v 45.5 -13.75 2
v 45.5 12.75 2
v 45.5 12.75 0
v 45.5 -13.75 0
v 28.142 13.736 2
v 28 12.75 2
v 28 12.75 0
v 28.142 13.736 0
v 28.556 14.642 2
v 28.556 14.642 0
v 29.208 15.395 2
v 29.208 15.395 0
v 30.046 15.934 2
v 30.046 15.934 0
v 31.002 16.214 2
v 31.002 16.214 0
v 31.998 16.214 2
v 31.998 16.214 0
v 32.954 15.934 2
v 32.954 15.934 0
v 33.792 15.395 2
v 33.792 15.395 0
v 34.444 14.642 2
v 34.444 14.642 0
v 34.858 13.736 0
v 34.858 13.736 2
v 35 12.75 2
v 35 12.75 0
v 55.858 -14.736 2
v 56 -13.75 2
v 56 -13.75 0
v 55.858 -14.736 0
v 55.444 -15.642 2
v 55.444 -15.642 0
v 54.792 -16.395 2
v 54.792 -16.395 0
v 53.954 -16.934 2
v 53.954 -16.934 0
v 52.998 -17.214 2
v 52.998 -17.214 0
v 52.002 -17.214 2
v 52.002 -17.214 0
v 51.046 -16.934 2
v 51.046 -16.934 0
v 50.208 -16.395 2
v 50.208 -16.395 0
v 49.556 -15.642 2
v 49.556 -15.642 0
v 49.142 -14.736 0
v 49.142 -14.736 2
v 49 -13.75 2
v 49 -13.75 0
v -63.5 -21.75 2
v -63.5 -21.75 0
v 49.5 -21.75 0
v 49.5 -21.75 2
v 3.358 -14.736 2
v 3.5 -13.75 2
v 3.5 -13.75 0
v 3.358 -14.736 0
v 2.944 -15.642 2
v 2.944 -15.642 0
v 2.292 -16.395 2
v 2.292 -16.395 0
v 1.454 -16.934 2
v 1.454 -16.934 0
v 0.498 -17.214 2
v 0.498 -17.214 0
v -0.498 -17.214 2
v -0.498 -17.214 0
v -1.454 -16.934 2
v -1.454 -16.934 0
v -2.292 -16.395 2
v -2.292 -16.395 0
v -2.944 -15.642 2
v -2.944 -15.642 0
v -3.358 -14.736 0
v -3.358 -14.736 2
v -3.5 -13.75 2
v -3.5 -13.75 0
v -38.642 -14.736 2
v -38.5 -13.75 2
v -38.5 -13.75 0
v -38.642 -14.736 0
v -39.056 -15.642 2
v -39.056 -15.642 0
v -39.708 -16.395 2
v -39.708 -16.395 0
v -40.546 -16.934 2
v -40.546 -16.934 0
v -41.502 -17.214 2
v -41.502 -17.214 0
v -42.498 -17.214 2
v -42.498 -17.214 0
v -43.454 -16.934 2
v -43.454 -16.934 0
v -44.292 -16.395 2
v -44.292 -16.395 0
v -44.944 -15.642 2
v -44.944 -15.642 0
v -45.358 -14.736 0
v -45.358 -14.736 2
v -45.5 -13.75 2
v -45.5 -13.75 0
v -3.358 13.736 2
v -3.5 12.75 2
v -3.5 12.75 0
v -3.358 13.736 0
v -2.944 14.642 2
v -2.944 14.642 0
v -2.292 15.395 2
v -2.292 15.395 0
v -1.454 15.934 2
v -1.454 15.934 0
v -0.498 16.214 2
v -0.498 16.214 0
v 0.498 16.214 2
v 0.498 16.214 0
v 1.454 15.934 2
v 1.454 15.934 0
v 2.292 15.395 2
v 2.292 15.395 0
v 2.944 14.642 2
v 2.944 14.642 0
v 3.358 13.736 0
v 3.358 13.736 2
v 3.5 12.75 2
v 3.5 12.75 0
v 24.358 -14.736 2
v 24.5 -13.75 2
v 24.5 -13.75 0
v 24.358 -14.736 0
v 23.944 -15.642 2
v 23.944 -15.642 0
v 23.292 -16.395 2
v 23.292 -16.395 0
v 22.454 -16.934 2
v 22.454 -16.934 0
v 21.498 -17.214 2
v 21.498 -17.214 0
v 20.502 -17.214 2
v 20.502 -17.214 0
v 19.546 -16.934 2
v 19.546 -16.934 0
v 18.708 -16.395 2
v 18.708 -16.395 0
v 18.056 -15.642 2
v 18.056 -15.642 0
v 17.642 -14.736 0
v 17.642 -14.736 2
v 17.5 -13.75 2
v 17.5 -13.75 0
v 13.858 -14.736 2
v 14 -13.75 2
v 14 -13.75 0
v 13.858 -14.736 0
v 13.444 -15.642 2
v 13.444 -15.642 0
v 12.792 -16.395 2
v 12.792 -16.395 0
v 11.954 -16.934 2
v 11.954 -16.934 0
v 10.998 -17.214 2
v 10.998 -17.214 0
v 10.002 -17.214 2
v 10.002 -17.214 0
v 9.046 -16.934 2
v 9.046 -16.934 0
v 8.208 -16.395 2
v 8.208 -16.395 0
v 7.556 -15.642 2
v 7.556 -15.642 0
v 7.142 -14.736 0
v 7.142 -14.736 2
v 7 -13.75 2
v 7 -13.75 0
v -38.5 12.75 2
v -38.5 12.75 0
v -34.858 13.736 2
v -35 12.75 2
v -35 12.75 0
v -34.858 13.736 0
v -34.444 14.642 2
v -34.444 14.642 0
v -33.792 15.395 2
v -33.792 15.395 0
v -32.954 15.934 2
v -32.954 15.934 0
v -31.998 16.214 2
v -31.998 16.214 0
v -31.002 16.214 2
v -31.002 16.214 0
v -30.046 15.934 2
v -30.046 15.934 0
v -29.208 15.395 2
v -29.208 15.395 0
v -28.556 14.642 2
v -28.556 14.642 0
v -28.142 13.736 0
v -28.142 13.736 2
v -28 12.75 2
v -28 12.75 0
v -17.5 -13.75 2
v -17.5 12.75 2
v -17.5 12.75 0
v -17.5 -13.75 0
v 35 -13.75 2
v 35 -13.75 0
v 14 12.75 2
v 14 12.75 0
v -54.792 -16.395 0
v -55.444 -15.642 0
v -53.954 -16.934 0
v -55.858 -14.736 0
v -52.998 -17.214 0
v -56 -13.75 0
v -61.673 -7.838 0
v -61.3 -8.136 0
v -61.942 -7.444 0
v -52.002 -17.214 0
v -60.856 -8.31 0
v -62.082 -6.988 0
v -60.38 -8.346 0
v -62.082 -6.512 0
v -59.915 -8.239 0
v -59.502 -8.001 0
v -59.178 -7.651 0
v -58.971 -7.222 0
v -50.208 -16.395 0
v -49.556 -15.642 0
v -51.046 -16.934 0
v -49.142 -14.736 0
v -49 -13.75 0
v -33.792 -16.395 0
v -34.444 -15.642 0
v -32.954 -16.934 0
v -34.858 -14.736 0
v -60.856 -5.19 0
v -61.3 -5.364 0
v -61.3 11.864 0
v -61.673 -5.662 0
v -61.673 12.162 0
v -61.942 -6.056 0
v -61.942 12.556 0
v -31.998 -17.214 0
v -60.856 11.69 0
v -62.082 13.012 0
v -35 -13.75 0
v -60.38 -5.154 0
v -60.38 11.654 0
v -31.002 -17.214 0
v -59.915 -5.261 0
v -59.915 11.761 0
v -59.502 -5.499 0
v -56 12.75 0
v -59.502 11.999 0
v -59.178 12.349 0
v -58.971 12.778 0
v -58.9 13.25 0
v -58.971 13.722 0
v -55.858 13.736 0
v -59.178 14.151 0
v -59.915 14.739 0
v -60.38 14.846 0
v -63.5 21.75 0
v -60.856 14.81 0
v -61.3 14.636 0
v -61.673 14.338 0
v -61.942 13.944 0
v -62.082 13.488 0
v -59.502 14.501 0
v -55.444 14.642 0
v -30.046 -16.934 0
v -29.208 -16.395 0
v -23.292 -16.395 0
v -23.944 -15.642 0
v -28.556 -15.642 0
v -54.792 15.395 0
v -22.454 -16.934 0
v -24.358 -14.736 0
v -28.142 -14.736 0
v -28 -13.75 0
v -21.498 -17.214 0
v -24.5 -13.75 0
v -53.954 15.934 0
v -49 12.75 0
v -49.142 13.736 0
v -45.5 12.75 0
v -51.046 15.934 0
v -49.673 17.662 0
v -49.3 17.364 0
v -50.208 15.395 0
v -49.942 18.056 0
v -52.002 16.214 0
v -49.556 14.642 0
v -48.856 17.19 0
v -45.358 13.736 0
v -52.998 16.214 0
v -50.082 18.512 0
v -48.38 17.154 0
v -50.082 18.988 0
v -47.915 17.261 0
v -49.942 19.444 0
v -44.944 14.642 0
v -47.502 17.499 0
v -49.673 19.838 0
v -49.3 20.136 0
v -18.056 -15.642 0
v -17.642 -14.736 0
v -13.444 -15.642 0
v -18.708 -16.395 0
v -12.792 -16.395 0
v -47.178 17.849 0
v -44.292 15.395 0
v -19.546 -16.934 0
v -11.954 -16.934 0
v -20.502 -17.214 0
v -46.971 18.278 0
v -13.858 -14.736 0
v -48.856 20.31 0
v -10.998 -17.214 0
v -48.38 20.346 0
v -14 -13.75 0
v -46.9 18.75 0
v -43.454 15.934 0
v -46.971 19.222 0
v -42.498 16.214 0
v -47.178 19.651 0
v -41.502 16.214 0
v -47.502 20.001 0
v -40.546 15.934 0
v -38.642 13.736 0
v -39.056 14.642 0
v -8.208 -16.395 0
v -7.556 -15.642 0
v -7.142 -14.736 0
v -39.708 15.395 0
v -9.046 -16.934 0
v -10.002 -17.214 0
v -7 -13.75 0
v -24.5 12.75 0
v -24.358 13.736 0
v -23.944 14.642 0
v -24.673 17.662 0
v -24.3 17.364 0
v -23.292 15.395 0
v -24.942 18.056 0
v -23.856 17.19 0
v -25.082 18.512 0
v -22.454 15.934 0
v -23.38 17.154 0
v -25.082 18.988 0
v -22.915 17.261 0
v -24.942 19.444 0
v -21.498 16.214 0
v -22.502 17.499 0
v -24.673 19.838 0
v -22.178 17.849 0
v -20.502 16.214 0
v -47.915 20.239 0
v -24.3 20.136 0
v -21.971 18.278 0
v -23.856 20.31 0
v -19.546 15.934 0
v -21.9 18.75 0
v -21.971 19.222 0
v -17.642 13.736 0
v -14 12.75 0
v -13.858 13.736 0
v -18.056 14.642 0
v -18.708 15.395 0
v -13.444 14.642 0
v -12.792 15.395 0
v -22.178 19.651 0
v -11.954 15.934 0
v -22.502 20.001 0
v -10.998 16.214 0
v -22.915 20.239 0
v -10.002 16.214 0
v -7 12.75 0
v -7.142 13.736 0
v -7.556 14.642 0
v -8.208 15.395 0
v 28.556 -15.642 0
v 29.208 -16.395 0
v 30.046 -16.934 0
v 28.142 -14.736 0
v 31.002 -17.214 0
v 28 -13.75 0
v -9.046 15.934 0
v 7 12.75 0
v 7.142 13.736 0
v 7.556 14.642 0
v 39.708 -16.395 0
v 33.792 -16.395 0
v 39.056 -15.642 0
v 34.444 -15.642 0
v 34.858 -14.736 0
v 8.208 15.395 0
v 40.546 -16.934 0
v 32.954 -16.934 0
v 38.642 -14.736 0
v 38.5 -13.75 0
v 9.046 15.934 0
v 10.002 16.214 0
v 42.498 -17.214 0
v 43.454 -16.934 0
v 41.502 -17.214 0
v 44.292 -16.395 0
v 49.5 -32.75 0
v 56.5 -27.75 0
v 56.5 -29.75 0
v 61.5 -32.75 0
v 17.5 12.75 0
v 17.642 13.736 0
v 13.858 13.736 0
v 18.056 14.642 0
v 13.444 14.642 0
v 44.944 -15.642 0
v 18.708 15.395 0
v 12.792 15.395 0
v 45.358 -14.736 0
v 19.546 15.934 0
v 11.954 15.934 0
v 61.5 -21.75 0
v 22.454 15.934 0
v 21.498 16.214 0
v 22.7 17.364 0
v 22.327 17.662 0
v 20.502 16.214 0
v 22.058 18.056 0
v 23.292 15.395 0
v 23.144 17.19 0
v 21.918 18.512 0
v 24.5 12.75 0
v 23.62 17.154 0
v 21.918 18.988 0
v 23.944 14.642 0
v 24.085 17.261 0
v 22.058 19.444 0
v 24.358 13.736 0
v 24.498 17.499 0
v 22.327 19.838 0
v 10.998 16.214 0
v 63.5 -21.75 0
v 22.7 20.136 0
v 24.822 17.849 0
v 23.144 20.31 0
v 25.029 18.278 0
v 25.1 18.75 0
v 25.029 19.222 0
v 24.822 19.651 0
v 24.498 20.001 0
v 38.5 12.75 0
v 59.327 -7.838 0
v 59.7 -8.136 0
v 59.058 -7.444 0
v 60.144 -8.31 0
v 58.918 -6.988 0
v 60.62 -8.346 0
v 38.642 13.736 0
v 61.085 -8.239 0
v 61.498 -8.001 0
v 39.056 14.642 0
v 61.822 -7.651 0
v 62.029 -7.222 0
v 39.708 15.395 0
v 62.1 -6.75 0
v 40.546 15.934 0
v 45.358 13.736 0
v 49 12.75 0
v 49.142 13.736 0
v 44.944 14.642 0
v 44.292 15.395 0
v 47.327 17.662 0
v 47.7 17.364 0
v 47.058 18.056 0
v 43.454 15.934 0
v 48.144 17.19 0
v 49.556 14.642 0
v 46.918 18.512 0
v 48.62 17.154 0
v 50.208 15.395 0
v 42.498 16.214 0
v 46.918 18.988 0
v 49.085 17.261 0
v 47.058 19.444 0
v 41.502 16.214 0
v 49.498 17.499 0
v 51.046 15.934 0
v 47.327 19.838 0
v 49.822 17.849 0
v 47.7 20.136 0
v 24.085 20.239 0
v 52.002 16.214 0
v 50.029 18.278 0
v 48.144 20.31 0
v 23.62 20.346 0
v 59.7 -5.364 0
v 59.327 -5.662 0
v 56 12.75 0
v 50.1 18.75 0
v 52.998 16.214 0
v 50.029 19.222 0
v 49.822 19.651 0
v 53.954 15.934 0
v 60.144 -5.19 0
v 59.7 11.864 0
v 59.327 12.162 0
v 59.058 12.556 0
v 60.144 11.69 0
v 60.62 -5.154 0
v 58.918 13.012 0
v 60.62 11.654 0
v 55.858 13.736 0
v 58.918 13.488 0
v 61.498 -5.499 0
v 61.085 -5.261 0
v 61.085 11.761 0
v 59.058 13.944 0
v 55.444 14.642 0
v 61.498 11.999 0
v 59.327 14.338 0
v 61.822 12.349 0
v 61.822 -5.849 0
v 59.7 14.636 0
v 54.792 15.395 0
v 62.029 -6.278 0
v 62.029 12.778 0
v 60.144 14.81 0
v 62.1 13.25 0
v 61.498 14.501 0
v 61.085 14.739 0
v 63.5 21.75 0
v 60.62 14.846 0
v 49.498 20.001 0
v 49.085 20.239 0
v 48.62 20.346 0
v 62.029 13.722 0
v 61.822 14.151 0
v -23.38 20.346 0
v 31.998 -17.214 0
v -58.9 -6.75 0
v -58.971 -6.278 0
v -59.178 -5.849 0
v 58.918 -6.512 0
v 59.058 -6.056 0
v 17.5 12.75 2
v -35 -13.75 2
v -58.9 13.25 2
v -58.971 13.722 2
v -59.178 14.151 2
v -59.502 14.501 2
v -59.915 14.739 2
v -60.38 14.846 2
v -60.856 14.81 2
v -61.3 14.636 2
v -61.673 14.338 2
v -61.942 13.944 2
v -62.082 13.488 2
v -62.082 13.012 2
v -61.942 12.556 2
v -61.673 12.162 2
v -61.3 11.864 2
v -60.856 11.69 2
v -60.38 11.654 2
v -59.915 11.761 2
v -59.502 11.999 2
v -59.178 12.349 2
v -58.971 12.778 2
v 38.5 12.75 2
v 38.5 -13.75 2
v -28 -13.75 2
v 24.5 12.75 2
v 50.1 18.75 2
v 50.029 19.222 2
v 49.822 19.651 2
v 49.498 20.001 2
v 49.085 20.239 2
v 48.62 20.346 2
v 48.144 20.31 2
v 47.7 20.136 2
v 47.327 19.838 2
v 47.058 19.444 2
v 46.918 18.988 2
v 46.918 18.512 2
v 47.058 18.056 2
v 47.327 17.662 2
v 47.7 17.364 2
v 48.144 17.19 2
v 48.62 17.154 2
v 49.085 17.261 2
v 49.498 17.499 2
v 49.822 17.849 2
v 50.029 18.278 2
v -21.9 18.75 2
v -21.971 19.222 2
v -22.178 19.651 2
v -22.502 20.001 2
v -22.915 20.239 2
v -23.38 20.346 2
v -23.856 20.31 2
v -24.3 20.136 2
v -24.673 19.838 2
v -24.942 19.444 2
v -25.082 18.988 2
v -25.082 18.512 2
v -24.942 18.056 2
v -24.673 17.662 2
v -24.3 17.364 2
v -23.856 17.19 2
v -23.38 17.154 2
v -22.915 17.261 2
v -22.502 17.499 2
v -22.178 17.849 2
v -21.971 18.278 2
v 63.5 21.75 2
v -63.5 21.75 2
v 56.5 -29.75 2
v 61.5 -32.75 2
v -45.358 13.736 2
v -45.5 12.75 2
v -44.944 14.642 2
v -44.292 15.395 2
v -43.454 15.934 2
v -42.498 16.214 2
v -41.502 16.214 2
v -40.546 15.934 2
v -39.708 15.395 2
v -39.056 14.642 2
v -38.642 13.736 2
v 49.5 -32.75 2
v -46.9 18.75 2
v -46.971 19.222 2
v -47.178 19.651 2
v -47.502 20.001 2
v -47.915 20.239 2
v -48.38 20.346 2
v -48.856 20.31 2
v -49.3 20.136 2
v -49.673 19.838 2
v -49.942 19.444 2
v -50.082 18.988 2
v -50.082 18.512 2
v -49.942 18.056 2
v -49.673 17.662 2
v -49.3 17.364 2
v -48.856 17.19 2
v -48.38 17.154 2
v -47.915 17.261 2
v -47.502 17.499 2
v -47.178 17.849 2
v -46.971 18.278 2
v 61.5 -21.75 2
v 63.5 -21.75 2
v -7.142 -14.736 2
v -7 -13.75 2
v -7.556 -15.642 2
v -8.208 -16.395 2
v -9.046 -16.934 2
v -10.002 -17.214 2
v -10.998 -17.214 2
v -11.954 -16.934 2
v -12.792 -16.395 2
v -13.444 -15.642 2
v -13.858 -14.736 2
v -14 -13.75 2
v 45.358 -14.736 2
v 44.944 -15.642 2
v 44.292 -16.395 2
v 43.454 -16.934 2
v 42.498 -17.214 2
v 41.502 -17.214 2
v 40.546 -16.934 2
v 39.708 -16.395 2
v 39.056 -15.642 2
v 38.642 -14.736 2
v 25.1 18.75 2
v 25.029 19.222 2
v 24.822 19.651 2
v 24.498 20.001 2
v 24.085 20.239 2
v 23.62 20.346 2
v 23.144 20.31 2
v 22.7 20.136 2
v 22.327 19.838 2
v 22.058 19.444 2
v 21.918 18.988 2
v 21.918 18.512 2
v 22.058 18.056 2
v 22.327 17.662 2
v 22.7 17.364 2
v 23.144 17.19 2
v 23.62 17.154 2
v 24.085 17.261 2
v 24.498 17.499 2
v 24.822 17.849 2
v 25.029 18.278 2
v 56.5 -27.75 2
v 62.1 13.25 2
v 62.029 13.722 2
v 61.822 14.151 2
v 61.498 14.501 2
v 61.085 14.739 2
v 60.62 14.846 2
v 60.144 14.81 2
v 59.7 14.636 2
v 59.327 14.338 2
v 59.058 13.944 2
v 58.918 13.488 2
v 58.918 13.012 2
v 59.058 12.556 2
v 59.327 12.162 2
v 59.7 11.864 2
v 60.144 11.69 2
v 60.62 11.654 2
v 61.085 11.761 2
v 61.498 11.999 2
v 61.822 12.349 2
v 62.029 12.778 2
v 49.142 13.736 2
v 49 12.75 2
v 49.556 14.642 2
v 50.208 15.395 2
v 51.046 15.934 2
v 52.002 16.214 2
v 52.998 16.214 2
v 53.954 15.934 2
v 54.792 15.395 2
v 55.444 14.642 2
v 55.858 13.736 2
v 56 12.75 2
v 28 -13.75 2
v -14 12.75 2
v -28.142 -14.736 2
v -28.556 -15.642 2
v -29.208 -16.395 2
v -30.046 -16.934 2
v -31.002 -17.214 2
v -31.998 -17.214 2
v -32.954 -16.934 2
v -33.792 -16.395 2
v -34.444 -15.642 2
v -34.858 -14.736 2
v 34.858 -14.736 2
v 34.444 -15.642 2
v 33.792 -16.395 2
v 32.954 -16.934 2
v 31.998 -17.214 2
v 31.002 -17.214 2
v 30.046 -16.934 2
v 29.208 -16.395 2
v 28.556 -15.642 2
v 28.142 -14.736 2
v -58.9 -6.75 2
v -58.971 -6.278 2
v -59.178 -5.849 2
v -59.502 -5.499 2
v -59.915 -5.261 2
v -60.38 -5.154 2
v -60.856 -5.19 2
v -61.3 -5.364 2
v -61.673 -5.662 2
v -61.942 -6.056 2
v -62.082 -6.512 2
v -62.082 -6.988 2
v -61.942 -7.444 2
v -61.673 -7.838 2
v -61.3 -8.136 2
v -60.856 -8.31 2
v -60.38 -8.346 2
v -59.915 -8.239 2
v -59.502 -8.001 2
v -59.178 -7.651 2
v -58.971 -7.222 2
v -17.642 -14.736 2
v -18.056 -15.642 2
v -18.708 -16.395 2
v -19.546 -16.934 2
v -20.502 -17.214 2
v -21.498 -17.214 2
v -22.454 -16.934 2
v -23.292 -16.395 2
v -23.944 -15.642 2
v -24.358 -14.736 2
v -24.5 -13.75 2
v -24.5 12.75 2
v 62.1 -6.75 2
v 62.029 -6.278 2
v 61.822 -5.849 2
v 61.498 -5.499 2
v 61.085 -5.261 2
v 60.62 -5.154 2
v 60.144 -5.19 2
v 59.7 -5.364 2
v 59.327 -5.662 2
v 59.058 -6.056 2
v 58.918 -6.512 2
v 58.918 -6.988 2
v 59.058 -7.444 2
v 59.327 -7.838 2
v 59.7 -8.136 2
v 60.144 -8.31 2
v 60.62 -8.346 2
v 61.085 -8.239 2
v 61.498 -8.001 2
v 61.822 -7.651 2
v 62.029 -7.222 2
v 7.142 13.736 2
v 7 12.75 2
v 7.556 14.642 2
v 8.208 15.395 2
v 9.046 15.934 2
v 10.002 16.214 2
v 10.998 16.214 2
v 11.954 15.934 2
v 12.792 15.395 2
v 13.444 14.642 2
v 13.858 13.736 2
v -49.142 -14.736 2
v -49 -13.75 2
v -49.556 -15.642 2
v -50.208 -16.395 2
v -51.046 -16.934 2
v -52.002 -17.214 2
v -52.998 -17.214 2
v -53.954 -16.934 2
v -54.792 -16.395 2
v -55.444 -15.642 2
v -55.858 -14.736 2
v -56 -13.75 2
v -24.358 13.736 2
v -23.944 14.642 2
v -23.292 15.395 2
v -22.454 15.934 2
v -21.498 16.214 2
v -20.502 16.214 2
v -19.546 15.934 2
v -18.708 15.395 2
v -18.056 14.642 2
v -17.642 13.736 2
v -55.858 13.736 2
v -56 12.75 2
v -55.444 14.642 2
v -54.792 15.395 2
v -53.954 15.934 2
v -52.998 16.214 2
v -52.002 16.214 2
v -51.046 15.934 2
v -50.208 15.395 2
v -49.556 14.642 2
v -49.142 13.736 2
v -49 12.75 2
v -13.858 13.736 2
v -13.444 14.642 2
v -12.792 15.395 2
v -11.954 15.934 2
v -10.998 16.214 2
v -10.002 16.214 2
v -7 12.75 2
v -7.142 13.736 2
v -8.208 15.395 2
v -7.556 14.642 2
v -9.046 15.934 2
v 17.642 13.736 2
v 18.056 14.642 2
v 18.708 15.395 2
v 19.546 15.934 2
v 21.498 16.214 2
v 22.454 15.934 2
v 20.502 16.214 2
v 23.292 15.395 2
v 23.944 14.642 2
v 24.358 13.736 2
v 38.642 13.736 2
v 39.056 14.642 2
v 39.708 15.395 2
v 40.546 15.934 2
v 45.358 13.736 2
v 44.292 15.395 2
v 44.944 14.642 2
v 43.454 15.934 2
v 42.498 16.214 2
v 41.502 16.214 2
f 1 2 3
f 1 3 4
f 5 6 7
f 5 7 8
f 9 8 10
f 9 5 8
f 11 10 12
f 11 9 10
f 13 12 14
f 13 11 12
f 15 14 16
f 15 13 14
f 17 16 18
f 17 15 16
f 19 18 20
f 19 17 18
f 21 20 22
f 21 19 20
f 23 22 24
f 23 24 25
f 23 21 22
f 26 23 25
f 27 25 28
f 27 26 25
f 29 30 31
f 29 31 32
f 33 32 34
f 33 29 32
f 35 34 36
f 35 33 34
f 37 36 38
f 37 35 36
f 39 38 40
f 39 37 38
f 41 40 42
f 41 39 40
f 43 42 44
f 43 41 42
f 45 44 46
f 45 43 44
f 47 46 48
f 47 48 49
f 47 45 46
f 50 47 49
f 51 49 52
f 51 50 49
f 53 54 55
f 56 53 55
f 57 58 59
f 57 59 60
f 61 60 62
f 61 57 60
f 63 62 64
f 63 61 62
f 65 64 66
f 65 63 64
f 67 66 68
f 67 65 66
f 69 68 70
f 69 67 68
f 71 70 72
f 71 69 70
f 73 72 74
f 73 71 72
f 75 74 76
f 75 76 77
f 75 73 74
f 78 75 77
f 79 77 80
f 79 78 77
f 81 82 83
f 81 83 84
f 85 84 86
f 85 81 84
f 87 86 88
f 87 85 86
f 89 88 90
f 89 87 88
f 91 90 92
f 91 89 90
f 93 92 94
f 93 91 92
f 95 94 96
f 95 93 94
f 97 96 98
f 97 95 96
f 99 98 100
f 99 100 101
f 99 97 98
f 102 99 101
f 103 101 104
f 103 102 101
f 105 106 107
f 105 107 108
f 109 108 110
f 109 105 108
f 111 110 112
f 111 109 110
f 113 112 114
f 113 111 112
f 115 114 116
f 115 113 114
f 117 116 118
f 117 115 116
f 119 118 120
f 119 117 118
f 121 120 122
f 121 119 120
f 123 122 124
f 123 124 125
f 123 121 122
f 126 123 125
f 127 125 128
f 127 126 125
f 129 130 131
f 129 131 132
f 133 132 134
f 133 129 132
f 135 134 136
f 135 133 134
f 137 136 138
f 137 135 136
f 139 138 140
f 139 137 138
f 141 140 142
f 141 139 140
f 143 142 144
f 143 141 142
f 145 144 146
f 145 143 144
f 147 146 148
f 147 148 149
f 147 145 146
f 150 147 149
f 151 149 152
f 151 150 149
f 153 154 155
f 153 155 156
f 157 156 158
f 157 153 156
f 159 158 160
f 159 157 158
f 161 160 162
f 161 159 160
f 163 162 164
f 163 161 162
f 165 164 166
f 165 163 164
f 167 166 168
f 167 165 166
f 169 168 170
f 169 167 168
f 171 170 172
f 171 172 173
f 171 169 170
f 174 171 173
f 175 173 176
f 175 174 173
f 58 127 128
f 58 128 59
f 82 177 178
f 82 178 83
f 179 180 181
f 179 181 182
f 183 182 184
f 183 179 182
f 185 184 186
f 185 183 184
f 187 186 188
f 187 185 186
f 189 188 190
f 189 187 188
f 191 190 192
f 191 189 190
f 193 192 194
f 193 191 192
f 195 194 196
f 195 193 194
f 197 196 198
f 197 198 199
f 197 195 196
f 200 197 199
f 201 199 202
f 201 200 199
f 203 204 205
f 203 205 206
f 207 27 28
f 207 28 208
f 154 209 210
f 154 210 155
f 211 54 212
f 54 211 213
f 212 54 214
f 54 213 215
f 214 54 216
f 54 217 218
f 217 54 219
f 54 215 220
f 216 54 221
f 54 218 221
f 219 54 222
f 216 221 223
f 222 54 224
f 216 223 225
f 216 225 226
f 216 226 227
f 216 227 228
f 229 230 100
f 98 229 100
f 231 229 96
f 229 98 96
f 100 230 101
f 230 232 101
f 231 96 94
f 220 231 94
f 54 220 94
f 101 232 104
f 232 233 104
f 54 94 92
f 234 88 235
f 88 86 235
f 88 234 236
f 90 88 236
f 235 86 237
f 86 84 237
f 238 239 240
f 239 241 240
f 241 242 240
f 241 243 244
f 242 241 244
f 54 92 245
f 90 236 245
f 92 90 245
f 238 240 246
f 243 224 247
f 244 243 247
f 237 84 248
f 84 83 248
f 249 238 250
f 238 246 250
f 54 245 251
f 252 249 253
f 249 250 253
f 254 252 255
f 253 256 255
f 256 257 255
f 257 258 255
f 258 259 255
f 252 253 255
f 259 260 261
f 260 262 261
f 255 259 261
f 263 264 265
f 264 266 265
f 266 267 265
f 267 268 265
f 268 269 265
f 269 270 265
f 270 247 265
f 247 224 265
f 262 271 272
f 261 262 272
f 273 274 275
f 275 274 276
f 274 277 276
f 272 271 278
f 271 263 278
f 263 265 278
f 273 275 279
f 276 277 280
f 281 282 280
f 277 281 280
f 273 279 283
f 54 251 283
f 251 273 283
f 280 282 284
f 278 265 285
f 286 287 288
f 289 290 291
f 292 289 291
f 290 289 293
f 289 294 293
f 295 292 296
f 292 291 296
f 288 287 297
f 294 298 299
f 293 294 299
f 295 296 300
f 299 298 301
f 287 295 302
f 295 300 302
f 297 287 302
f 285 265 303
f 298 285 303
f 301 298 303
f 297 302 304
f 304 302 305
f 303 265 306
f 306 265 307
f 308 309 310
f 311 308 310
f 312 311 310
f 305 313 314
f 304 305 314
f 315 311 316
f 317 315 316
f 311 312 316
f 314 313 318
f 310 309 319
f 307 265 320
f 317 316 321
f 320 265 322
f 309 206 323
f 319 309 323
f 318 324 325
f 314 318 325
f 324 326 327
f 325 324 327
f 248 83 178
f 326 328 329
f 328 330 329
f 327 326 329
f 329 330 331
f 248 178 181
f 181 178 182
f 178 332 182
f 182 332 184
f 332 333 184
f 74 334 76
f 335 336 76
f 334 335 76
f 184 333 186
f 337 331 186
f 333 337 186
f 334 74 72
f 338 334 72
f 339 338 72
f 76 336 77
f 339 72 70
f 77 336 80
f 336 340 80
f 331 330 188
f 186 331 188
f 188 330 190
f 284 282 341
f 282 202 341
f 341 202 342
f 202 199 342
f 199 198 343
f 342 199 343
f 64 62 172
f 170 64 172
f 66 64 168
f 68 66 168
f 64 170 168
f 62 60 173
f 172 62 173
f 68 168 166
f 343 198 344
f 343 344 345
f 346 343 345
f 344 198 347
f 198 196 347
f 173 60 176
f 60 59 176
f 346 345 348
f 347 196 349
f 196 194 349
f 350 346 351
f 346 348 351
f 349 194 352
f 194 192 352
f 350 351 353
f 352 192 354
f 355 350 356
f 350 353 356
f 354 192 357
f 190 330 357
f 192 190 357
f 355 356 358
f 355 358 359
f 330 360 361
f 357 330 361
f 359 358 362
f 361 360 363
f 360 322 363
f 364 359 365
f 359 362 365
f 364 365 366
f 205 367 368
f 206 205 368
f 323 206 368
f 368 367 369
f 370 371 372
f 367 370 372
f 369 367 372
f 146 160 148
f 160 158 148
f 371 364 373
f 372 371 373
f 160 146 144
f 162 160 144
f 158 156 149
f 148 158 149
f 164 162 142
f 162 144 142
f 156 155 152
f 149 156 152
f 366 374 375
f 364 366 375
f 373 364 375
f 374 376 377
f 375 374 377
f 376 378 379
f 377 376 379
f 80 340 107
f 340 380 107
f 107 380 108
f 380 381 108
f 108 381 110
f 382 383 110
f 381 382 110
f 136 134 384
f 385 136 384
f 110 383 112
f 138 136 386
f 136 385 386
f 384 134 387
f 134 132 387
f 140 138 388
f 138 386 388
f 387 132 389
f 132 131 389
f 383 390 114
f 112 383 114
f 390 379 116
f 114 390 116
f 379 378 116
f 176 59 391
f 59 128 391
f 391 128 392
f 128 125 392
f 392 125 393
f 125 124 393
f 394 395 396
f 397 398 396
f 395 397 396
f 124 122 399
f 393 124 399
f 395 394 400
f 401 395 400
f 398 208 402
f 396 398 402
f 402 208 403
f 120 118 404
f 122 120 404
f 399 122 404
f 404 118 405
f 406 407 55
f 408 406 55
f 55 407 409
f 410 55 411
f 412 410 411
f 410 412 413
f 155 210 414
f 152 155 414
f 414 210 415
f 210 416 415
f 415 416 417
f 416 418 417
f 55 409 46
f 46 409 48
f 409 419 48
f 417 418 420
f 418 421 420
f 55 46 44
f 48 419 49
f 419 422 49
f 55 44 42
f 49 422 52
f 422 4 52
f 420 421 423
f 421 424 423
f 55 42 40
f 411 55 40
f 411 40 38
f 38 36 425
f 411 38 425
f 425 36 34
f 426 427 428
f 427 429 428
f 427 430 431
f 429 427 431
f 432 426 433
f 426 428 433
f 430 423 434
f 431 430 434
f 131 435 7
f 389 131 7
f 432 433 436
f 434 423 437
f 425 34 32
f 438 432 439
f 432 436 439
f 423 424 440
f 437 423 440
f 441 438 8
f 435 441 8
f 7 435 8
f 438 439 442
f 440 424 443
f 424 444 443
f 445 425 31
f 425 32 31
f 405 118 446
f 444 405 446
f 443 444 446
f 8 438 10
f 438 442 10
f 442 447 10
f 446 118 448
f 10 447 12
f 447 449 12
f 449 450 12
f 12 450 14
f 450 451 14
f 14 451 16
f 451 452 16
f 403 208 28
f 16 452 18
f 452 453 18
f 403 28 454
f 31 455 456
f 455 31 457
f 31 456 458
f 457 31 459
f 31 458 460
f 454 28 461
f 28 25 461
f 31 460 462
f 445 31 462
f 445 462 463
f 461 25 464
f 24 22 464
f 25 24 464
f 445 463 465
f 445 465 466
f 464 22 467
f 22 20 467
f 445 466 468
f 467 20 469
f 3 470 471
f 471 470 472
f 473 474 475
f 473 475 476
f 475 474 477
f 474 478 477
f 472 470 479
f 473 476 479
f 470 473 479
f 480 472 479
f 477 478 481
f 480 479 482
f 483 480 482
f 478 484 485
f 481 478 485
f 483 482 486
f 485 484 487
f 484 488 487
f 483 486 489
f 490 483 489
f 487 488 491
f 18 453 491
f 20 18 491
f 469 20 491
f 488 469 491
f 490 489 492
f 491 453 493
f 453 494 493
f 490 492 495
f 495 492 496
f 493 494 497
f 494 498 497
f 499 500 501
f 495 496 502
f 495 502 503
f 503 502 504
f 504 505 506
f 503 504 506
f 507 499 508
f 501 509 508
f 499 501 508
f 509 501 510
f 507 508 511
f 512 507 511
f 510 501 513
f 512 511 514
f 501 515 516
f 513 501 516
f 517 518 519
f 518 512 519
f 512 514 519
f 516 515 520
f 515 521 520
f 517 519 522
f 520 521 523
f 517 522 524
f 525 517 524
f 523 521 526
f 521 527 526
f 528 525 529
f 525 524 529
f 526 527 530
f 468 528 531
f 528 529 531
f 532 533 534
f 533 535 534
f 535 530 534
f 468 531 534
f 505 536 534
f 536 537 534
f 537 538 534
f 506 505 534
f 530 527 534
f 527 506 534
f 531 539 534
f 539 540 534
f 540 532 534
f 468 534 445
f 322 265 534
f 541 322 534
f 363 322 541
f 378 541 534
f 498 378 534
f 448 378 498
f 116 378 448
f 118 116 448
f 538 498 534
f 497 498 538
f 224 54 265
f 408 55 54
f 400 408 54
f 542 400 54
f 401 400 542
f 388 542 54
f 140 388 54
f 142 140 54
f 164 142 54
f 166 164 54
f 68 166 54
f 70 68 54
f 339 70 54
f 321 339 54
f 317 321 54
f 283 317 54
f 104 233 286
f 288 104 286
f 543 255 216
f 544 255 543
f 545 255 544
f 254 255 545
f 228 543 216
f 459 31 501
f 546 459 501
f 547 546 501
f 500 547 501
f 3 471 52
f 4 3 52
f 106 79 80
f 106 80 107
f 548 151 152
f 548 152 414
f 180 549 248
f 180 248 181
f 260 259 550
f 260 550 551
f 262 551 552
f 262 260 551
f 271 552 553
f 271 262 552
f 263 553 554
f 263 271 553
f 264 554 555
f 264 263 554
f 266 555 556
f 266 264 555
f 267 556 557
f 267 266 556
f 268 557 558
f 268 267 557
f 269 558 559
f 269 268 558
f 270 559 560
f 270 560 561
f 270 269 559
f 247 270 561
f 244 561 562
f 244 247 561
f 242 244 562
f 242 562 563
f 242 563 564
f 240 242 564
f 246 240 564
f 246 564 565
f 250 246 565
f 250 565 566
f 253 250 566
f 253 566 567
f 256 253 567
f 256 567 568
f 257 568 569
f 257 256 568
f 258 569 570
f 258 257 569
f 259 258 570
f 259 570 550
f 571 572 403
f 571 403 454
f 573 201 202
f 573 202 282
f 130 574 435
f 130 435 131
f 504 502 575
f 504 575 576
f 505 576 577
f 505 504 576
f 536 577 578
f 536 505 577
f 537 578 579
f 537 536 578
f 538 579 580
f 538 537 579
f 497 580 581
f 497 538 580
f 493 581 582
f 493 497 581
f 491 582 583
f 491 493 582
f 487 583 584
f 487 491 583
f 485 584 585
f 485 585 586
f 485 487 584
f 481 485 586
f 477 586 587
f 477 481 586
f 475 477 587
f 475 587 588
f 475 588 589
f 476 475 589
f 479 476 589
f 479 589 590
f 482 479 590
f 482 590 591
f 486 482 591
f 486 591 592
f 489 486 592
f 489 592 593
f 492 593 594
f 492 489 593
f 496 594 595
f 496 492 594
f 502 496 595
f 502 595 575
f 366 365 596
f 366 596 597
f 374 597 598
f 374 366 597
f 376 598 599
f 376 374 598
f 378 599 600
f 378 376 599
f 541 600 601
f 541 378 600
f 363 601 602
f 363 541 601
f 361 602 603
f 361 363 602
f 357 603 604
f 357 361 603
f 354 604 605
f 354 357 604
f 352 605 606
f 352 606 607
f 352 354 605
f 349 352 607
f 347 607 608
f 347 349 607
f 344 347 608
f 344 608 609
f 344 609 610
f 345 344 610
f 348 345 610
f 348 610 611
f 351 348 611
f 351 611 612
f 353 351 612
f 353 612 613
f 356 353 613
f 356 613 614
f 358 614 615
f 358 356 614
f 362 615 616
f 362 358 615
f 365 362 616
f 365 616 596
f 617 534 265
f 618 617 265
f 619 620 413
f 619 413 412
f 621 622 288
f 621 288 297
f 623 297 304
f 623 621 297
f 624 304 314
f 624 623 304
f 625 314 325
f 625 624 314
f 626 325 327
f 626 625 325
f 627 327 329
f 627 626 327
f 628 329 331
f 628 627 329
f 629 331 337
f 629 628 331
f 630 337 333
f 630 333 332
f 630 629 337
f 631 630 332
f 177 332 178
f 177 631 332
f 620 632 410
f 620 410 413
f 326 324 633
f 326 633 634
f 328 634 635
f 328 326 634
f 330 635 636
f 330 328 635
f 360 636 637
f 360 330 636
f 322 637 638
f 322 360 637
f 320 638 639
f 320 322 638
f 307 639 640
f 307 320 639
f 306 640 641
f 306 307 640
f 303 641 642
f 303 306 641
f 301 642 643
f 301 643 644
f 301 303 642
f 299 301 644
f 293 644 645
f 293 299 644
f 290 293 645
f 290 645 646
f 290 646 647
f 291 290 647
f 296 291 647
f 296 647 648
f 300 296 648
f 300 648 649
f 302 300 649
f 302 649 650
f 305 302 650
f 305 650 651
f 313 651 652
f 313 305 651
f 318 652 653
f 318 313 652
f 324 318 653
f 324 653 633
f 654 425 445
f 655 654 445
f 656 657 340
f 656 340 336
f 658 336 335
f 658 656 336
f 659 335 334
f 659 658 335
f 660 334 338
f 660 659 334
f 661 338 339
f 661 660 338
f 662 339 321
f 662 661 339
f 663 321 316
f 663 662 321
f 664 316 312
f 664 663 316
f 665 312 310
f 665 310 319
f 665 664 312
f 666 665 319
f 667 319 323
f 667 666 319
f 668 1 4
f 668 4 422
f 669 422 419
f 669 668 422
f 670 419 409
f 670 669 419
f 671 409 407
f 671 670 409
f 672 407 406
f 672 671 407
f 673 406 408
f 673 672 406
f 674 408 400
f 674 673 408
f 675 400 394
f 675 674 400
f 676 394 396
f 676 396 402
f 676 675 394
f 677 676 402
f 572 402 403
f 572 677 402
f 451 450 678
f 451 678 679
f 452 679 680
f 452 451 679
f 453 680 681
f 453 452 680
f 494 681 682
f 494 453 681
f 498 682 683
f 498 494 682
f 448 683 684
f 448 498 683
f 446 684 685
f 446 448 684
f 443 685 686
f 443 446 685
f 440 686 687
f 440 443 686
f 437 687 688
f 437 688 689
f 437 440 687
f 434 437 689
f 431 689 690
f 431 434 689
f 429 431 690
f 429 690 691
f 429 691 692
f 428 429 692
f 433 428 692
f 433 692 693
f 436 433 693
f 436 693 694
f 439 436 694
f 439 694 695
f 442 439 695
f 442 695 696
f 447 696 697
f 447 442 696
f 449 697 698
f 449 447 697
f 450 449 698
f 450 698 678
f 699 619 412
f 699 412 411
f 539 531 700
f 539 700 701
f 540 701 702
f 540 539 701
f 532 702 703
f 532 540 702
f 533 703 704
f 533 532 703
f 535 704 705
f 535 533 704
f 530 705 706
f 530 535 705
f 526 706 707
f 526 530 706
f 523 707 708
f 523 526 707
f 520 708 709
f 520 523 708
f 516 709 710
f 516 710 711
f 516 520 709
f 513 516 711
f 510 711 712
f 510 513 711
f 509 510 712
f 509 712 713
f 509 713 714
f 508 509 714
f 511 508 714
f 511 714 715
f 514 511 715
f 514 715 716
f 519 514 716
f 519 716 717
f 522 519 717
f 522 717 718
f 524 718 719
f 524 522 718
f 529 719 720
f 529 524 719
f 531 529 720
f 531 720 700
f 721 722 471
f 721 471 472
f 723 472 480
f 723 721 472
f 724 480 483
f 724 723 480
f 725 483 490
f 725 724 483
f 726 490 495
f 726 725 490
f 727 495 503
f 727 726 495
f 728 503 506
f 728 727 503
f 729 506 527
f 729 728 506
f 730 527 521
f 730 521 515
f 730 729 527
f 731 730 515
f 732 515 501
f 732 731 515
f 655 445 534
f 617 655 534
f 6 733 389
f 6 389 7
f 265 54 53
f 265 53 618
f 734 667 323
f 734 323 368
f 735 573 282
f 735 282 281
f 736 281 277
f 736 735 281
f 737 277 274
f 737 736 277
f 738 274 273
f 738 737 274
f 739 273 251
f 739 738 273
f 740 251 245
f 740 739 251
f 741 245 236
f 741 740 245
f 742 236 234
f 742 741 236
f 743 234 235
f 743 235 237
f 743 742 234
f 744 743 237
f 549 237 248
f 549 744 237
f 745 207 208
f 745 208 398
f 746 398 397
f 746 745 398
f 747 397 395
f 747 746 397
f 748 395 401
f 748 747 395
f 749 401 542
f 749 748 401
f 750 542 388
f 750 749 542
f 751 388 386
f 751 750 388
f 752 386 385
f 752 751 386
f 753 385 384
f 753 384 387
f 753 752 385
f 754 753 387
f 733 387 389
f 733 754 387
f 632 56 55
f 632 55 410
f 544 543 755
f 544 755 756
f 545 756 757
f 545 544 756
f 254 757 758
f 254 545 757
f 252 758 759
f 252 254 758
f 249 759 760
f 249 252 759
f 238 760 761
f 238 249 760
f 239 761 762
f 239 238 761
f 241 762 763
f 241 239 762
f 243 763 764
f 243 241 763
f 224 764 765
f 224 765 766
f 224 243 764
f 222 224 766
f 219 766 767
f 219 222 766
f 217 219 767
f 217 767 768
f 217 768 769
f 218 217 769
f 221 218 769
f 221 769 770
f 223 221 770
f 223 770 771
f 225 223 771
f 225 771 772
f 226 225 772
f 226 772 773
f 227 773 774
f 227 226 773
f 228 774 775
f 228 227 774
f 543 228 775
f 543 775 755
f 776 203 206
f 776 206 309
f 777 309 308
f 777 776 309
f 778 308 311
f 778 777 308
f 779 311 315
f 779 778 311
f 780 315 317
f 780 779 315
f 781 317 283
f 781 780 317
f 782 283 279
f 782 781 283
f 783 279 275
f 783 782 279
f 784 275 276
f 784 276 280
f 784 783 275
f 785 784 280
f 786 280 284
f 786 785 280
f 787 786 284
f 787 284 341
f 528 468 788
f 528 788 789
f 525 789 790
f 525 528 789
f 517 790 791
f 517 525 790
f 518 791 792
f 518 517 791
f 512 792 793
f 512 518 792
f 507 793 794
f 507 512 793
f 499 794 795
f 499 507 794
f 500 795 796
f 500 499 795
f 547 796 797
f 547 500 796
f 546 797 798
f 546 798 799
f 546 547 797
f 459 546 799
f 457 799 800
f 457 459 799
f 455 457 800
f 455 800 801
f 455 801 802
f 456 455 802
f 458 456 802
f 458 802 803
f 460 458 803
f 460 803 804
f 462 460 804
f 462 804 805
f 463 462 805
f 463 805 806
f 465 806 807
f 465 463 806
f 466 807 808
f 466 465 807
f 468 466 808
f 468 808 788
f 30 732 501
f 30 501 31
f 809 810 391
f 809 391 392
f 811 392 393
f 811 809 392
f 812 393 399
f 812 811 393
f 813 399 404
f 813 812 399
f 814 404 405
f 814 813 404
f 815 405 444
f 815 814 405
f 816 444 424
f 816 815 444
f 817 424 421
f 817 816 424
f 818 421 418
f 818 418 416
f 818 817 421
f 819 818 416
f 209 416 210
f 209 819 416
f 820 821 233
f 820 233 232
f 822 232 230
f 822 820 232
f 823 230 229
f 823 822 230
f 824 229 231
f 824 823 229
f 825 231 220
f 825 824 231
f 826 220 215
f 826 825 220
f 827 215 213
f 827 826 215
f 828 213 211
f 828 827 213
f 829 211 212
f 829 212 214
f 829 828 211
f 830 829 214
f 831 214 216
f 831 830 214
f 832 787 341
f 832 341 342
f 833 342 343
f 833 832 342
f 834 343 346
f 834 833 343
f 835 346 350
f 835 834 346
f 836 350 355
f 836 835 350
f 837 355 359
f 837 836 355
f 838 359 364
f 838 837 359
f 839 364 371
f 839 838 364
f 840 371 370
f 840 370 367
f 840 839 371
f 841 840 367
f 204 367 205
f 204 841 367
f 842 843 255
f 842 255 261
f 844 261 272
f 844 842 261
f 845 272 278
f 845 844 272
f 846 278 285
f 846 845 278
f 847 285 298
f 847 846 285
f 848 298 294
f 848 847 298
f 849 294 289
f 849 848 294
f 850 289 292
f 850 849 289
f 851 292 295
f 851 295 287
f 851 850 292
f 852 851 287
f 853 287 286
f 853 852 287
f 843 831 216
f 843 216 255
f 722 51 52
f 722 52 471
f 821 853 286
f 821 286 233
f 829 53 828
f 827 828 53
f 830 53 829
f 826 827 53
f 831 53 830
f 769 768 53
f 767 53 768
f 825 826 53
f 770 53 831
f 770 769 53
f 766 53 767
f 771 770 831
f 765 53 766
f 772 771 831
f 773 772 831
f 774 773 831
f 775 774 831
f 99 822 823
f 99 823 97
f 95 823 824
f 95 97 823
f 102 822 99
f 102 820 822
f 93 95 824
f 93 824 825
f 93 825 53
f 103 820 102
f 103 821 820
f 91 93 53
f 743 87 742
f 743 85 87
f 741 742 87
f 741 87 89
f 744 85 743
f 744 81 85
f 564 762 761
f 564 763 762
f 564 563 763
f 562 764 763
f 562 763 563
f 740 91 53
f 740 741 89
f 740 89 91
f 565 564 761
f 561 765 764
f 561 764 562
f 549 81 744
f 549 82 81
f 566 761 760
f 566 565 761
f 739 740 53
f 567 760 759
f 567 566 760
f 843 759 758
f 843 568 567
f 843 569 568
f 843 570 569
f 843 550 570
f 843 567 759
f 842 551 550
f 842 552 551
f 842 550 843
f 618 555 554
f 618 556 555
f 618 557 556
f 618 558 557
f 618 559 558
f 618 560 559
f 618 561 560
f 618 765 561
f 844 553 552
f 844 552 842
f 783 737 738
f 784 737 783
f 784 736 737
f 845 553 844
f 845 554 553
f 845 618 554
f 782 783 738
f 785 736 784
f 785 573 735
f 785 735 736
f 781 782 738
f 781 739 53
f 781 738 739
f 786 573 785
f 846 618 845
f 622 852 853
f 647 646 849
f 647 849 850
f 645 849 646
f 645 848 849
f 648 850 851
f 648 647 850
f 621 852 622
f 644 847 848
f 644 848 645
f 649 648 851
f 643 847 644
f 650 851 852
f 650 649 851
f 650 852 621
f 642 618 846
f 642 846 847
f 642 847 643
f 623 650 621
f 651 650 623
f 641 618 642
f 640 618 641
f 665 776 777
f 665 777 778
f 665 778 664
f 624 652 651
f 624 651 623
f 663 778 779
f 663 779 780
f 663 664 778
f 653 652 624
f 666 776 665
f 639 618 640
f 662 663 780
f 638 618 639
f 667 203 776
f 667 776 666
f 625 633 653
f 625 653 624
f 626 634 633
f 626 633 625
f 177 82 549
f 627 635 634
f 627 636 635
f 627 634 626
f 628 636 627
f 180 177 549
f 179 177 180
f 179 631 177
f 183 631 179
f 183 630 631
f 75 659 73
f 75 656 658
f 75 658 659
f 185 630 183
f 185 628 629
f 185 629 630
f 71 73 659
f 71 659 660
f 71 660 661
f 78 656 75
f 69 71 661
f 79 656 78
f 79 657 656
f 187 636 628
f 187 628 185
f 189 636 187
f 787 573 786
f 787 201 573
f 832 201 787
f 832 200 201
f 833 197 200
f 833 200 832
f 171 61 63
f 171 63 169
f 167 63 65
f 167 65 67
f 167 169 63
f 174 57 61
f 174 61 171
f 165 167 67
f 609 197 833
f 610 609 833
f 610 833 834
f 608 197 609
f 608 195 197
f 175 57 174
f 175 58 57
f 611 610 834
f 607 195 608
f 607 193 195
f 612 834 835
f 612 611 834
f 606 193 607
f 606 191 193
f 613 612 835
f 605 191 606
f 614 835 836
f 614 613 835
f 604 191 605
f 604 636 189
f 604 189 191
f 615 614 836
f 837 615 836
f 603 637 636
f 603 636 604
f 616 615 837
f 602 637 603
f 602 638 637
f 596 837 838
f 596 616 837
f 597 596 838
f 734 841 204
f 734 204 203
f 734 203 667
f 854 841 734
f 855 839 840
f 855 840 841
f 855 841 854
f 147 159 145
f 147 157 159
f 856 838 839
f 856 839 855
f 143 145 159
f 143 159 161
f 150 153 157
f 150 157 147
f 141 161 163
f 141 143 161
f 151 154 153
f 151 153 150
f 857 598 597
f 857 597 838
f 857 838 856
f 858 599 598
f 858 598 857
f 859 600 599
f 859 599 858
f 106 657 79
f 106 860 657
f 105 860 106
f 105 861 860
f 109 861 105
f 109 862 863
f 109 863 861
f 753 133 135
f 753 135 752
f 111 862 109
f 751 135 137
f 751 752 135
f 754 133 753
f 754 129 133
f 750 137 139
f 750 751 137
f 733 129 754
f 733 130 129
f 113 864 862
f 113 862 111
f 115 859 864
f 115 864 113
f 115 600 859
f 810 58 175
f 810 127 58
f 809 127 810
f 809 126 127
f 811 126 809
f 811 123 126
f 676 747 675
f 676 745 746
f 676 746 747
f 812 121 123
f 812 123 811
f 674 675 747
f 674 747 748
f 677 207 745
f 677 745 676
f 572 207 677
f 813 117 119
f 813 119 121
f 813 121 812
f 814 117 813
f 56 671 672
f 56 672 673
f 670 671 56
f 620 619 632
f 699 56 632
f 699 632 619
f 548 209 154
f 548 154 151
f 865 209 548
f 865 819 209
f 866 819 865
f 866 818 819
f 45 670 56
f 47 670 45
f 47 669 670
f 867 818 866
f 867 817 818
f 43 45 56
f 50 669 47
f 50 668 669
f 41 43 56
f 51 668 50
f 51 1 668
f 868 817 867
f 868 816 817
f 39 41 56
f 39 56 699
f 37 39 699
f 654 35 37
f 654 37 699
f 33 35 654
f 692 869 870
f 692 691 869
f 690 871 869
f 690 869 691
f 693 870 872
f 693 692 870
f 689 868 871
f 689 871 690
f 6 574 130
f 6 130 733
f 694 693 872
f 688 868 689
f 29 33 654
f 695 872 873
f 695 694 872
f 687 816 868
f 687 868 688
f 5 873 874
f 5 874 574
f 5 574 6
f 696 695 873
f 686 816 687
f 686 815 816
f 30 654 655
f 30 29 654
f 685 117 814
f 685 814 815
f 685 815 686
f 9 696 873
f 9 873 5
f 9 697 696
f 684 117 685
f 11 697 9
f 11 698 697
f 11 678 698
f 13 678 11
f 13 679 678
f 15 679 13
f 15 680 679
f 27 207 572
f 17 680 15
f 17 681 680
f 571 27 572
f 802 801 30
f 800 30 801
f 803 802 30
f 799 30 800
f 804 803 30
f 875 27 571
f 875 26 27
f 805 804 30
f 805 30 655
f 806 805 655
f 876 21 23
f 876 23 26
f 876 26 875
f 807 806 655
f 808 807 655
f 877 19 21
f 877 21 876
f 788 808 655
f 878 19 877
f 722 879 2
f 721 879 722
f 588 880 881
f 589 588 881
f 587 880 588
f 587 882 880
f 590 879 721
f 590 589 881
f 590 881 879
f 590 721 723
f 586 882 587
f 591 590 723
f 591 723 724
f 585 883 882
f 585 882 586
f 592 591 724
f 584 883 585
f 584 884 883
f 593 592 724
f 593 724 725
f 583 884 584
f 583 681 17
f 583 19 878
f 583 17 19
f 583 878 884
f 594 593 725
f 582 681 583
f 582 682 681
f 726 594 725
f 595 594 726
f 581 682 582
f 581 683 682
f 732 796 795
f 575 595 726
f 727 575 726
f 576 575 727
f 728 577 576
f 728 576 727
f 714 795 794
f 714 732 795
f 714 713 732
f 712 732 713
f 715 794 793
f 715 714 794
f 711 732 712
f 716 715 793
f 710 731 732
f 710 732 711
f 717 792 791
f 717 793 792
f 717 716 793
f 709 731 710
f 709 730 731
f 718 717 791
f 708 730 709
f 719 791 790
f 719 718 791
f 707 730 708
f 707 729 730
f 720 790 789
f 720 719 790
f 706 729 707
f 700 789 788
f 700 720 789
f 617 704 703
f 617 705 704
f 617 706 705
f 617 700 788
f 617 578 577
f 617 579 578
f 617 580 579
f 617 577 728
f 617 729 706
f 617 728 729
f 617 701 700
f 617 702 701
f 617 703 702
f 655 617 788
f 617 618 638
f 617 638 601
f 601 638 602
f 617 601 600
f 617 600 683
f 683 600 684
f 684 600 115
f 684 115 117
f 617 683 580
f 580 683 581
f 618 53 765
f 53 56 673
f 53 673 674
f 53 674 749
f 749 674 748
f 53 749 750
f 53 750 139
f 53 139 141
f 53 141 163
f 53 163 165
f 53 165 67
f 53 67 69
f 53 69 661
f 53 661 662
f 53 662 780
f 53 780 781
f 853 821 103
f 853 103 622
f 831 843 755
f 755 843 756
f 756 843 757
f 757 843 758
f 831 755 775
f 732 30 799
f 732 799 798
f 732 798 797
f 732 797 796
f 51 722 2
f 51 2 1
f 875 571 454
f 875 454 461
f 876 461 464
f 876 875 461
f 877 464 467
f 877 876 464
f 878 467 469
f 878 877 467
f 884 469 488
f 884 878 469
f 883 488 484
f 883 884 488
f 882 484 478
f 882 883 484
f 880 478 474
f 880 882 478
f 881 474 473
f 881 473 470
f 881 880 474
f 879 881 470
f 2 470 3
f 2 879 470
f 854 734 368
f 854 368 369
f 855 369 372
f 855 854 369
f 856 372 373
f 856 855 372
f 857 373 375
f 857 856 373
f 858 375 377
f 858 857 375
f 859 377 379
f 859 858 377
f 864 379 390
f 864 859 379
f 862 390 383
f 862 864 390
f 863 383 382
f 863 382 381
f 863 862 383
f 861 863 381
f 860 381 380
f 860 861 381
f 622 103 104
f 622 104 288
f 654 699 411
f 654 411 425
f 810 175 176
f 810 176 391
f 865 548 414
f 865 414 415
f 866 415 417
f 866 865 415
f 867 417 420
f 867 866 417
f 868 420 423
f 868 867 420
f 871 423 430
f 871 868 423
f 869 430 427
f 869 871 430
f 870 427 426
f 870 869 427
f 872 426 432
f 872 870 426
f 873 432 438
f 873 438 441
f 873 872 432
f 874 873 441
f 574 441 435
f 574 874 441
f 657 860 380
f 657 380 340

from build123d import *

# Parameters (mm, degrees)
SKETCH_1_W          = 6
SKETCH_1_H          = 40
SKETCH_1_R          = 1.6
EXTRUDE_1_DEPTH     = 2
CUT_EXTRUDE_1_DEPTH = 2
EXTRUDE_2_DEPTH     = 2


with BuildPart() as part:
    # 草图1 → 凸台-拉伸1 (new body)
    # profile 1 of 3: a face of its own
    with BuildSketch(Plane.XY):
        with Locations((-60.5, -1.75)):
            Rectangle(SKETCH_1_W, SKETCH_1_H)
        with Locations((-60.5, -6.75)):
            Circle(SKETCH_1_R, mode=Mode.SUBTRACT)
        with Locations((-60.5, 13.25)):
            Circle(SKETCH_1_R, mode=Mode.SUBTRACT)
    # profile 2 of 3: a face of its own
    with BuildSketch(Plane.XY):
        Polygon((-57.5, 18.25), (-57.5, -21.75), (57.5, -21.75), (57.5, 18.25), (63.5, 18.25), (63.5, 21.75), (-63.5, 21.75), (-63.5, 18.25), align=None)
        with Locations((-48.5, 18.75)):
            Circle(SKETCH_1_R, mode=Mode.SUBTRACT)
        with Locations((-23.5, 18.75)):
            Circle(SKETCH_1_R, mode=Mode.SUBTRACT)
        with Locations((23.5, 18.75)):
            Circle(SKETCH_1_R, mode=Mode.SUBTRACT)
        with Locations((48.5, 18.75)):
            Circle(SKETCH_1_R, mode=Mode.SUBTRACT)
    # profile 3 of 3: a face of its own
    with BuildSketch(Plane.XY):
        with Locations((60.5, -1.75)):
            Rectangle(SKETCH_1_W, SKETCH_1_H)
        with Locations((60.5, -6.75)):
            Circle(SKETCH_1_R, mode=Mode.SUBTRACT)
        with Locations((60.5, 13.25)):
            Circle(SKETCH_1_R, mode=Mode.SUBTRACT)
    extrude(amount=EXTRUDE_1_DEPTH)

    # 草图2 → 切除-拉伸1 (cut)
    with BuildSketch(Plane.XY.offset(2)):
        with BuildLine():
            Line((3.5, 12.75), (3.5, -13.75))
            ThreePointArc((3.5, -13.75), (0, -17.25), (-3.5, -13.75))
            Line((-3.5, -13.75), (-3.5, 12.75))
            ThreePointArc((-3.5, 12.75), (0, 16.25), (3.5, 12.75))
        make_face()
        with BuildLine():
            Line((14, 12.75), (14, -13.75))
            ThreePointArc((14, -13.75), (10.5, -17.25), (7, -13.75))
            Line((7, -13.75), (7, 12.75))
            ThreePointArc((7, 12.75), (10.5, 16.25), (14, 12.75))
        make_face()
        with BuildLine():
            Line((24.5, 12.75), (24.5, -13.75))
            ThreePointArc((24.5, -13.75), (21, -17.25), (17.5, -13.75))
            Line((17.5, -13.75), (17.5, 12.75))
            ThreePointArc((17.5, 12.75), (21, 16.25), (24.5, 12.75))
        make_face()
        with BuildLine():
            Line((35, 12.75), (35, -13.75))
            ThreePointArc((35, -13.75), (31.5, -17.25), (28, -13.75))
            Line((28, -13.75), (28, 12.75))
            ThreePointArc((28, 12.75), (31.5, 16.25), (35, 12.75))
        make_face()
        with BuildLine():
            Line((45.5, 12.75), (45.5, -13.75))
            ThreePointArc((45.5, -13.75), (42, -17.25), (38.5, -13.75))
            Line((38.5, -13.75), (38.5, 12.75))
            ThreePointArc((38.5, 12.75), (42, 16.25), (45.5, 12.75))
        make_face()
        with BuildLine():
            Line((-7, 12.75), (-7, -13.75))
            ThreePointArc((-7, -13.75), (-10.5, -17.25), (-14, -13.75))
            Line((-14, -13.75), (-14, 12.75))
            ThreePointArc((-14, 12.75), (-10.5, 16.25), (-7, 12.75))
        make_face()
        with BuildLine():
            Line((-17.5, 12.75), (-17.5, -13.75))
            ThreePointArc((-17.5, -13.75), (-21, -17.25), (-24.5, -13.75))
            Line((-24.5, -13.75), (-24.5, 12.75))
            ThreePointArc((-24.5, 12.75), (-21, 16.25), (-17.5, 12.75))
        make_face()
        with BuildLine():
            Line((-28, 12.75), (-28, -13.75))
            ThreePointArc((-28, -13.75), (-31.5, -17.25), (-35, -13.75))
            Line((-35, -13.75), (-35, 12.75))
            ThreePointArc((-35, 12.75), (-31.5, 16.25), (-28, 12.75))
        make_face()
        with BuildLine():
            Line((-38.5, 12.75), (-38.5, -13.75))
            ThreePointArc((-38.5, -13.75), (-42, -17.25), (-45.5, -13.75))
            Line((-45.5, -13.75), (-45.5, 12.75))
            ThreePointArc((-45.5, 12.75), (-42, 16.25), (-38.5, 12.75))
        make_face()
        with BuildLine():
            Line((-49, 12.75), (-49, -13.75))
            ThreePointArc((-49, -13.75), (-52.5, -17.25), (-56, -13.75))
            Line((-56, -13.75), (-56, 12.75))
            ThreePointArc((-56, 12.75), (-52.5, 16.25), (-49, 12.75))
        make_face()
        with BuildLine():
            Line((56, 12.75), (56, -13.75))
            ThreePointArc((56, -13.75), (52.5, -17.25), (49, -13.75))
            Line((49, -13.75), (49, 12.75))
            ThreePointArc((49, 12.75), (52.5, 16.25), (56, 12.75))
        make_face()
    extrude(amount=-CUT_EXTRUDE_1_DEPTH, mode=Mode.SUBTRACT)

    # 草图3 → 凸台-拉伸2 (add)
    with BuildSketch(Plane.XY.offset(2)):
        Polygon((49.5, -21.75), (49.5, -32.75), (61.5, -32.75), (56.5, -29.75), (56.5, -27.75), (61.5, -21.75), align=None)
    extrude(amount=-EXTRUDE_2_DEPTH)


solid = part.part
